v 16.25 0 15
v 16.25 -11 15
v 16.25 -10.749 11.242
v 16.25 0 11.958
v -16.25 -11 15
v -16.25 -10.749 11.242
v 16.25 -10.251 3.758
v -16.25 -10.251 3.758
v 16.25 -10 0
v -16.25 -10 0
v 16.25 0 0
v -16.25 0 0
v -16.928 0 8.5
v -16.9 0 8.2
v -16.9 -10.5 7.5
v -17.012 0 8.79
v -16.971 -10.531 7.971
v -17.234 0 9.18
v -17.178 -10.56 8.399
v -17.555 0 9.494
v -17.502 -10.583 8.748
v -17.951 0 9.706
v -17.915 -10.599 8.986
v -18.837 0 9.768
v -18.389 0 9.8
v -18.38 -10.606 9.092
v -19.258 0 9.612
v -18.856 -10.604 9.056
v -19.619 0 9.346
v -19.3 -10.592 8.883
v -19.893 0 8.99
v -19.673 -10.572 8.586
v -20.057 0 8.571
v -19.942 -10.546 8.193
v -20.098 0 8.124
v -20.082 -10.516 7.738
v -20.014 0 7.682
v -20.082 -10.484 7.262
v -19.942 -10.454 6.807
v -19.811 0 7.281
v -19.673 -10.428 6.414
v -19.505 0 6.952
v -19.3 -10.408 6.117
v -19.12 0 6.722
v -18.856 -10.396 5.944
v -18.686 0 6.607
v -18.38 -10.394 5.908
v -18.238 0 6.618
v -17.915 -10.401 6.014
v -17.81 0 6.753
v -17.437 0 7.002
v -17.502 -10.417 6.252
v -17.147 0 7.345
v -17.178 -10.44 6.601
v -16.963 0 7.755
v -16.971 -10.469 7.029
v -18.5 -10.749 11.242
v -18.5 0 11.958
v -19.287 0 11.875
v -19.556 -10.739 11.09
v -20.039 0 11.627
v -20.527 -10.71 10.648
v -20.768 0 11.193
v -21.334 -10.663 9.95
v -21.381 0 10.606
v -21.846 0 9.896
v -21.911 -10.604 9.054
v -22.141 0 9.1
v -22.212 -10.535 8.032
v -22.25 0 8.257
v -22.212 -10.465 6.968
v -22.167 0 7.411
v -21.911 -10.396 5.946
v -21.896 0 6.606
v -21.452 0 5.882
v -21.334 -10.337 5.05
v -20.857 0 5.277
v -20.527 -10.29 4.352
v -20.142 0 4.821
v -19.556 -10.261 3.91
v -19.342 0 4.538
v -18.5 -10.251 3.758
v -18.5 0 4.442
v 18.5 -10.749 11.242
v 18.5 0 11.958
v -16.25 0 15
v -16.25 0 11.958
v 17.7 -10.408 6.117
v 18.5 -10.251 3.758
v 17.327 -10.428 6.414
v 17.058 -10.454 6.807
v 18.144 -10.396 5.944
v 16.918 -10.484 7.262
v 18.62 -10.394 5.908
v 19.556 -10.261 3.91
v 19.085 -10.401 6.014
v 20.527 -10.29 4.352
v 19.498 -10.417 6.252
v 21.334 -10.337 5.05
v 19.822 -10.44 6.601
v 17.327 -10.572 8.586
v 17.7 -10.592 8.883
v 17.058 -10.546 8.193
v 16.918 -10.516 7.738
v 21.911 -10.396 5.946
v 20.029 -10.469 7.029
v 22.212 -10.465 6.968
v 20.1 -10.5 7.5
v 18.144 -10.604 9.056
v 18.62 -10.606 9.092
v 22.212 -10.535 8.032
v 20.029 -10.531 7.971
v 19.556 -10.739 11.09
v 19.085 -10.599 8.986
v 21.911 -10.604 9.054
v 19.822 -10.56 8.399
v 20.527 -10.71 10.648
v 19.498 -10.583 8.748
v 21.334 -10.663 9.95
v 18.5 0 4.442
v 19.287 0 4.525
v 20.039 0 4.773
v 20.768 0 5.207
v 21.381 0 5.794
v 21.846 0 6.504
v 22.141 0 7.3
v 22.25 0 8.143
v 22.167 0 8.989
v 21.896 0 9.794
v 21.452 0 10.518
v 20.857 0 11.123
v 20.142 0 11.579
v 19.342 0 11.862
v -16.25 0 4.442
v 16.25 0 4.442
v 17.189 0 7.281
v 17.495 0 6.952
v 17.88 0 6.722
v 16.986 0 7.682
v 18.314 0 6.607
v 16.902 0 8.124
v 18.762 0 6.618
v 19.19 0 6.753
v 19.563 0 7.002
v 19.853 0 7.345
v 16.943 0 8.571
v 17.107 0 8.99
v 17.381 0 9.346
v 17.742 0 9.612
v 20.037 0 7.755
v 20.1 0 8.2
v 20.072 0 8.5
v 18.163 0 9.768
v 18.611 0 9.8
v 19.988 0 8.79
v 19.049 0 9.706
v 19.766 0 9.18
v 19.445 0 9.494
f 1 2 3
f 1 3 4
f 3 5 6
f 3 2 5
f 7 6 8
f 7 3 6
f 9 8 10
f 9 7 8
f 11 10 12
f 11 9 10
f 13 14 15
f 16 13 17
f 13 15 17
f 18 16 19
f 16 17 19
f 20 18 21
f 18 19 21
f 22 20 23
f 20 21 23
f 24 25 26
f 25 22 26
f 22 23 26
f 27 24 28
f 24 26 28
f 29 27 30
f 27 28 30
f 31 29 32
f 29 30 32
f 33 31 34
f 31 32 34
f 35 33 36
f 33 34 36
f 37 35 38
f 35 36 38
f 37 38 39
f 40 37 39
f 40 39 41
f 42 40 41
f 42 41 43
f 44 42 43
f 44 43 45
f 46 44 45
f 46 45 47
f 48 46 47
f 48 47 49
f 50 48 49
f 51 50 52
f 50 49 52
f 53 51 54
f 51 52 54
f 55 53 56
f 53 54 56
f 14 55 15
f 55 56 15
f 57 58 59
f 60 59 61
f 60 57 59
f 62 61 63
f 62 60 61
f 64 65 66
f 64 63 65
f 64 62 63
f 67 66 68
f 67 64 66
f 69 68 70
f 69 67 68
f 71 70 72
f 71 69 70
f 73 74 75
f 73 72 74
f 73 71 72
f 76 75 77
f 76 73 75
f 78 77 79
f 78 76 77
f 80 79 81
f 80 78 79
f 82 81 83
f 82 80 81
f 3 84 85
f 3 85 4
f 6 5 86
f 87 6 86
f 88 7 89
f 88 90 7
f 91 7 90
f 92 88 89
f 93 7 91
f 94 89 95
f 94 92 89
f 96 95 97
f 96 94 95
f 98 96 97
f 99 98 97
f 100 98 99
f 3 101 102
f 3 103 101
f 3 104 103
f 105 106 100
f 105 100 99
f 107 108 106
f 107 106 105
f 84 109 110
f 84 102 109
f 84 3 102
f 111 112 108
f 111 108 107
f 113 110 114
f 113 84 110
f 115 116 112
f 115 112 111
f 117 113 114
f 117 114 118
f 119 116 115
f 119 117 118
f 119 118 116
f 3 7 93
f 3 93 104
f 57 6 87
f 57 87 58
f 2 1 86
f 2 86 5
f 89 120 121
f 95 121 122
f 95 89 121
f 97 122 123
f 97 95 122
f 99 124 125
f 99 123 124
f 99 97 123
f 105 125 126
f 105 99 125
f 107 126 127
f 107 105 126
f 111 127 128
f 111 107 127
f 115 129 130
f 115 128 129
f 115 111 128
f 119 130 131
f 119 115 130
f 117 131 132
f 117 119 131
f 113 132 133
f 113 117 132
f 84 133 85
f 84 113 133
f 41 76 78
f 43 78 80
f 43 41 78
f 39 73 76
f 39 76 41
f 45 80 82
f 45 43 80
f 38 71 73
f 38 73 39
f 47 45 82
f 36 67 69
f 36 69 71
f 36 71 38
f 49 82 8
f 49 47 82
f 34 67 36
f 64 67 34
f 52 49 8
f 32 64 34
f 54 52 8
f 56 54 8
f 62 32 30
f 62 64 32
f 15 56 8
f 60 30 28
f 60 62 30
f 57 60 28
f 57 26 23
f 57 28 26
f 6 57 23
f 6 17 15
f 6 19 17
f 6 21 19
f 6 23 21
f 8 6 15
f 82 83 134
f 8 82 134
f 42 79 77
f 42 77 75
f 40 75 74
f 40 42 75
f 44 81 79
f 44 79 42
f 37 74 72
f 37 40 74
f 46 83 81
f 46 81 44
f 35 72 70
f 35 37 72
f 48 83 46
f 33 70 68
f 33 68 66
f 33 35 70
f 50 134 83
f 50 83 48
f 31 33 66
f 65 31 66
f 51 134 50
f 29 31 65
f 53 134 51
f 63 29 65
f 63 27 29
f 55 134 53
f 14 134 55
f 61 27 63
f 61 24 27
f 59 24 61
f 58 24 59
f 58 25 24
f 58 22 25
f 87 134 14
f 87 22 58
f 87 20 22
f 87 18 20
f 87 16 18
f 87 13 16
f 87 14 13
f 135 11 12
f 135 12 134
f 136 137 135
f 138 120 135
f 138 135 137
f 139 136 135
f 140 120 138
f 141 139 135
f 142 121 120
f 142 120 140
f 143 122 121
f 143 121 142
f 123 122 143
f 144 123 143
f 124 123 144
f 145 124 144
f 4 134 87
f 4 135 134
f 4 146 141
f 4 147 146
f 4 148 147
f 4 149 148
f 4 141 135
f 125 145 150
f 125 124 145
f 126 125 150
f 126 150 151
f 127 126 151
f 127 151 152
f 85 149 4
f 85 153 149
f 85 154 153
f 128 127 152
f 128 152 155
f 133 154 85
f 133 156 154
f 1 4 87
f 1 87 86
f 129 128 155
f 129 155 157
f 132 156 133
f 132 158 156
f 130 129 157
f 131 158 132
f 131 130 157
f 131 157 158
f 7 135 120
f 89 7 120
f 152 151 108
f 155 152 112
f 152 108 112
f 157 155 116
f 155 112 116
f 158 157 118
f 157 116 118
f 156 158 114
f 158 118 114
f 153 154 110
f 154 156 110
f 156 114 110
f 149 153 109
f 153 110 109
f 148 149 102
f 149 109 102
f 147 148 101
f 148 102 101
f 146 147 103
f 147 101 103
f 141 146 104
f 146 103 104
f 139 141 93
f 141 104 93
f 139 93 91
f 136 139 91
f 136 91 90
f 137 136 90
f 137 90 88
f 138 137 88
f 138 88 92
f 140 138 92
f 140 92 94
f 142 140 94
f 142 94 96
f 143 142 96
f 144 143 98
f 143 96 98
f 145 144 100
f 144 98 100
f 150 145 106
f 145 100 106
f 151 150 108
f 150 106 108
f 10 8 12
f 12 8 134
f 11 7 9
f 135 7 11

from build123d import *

# Parameters (mm, degrees)
F1_DEPTH = 16.25
F2_R     = 1.6
F3_REACH = 20.5813230926


with BuildPart() as f1:
    # F0 (on Right) → F1 (new body, symmetric)
    with BuildSketch(Plane.YZ):
        Polygon((-10, 0), (0, 0), (0, 15), (-11, 15), align=None)
    extrude(amount=F1_DEPTH, both=True)

    f3_end = Plane(origin=(0, 0, 7.5), x_dir=(0, 0, 1), z_dir=(0, 1, 0))
    # F2 (on face) → F3 (join, up to a plane its end follows)
    with BuildSketch(Plane(origin=(0, -9.9557522124, -0.6637168142), x_dir=(1, 0, 0), z_dir=(0, -0.9977851579, -0.0665190105))):
        with BuildLine():
            Line((-18.5, 4.4318382944), (-16.25, 4.4318382944))
            Line((-16.25, 4.4318382944), (-16.25, 11.9318382944))
            Line((-16.25, 11.9318382944), (-18.5, 11.9318382944))
            ThreePointArc((-18.5, 11.9318382944), (-22.25, 8.1818382944), (-18.5, 4.4318382944))
        make_face()
        with Locations((-18.5, 8.1818382944)):
            Circle(F2_R, mode=Mode.SUBTRACT)
        with BuildLine():
            Line((16.25, 4.4318382944), (18.5, 4.4318382944))
            ThreePointArc((18.5, 4.4318382944), (22.25, 8.1818382944), (18.5, 11.9318382944))
            Line((18.5, 11.9318382944), (16.25, 11.9318382944))
            Line((16.25, 11.9318382944), (16.25, 4.4318382944))
        make_face()
        with Locations((18.5, 8.1818382944)):
            Circle(F2_R, mode=Mode.SUBTRACT)
    f3_long = extrude(amount=-F3_REACH, mode=Mode.PRIVATE)
    add(split(f3_long, bisect_by=f3_end, keep=Keep.BOTTOM, mode=Mode.PRIVATE))


solid = f1.part
